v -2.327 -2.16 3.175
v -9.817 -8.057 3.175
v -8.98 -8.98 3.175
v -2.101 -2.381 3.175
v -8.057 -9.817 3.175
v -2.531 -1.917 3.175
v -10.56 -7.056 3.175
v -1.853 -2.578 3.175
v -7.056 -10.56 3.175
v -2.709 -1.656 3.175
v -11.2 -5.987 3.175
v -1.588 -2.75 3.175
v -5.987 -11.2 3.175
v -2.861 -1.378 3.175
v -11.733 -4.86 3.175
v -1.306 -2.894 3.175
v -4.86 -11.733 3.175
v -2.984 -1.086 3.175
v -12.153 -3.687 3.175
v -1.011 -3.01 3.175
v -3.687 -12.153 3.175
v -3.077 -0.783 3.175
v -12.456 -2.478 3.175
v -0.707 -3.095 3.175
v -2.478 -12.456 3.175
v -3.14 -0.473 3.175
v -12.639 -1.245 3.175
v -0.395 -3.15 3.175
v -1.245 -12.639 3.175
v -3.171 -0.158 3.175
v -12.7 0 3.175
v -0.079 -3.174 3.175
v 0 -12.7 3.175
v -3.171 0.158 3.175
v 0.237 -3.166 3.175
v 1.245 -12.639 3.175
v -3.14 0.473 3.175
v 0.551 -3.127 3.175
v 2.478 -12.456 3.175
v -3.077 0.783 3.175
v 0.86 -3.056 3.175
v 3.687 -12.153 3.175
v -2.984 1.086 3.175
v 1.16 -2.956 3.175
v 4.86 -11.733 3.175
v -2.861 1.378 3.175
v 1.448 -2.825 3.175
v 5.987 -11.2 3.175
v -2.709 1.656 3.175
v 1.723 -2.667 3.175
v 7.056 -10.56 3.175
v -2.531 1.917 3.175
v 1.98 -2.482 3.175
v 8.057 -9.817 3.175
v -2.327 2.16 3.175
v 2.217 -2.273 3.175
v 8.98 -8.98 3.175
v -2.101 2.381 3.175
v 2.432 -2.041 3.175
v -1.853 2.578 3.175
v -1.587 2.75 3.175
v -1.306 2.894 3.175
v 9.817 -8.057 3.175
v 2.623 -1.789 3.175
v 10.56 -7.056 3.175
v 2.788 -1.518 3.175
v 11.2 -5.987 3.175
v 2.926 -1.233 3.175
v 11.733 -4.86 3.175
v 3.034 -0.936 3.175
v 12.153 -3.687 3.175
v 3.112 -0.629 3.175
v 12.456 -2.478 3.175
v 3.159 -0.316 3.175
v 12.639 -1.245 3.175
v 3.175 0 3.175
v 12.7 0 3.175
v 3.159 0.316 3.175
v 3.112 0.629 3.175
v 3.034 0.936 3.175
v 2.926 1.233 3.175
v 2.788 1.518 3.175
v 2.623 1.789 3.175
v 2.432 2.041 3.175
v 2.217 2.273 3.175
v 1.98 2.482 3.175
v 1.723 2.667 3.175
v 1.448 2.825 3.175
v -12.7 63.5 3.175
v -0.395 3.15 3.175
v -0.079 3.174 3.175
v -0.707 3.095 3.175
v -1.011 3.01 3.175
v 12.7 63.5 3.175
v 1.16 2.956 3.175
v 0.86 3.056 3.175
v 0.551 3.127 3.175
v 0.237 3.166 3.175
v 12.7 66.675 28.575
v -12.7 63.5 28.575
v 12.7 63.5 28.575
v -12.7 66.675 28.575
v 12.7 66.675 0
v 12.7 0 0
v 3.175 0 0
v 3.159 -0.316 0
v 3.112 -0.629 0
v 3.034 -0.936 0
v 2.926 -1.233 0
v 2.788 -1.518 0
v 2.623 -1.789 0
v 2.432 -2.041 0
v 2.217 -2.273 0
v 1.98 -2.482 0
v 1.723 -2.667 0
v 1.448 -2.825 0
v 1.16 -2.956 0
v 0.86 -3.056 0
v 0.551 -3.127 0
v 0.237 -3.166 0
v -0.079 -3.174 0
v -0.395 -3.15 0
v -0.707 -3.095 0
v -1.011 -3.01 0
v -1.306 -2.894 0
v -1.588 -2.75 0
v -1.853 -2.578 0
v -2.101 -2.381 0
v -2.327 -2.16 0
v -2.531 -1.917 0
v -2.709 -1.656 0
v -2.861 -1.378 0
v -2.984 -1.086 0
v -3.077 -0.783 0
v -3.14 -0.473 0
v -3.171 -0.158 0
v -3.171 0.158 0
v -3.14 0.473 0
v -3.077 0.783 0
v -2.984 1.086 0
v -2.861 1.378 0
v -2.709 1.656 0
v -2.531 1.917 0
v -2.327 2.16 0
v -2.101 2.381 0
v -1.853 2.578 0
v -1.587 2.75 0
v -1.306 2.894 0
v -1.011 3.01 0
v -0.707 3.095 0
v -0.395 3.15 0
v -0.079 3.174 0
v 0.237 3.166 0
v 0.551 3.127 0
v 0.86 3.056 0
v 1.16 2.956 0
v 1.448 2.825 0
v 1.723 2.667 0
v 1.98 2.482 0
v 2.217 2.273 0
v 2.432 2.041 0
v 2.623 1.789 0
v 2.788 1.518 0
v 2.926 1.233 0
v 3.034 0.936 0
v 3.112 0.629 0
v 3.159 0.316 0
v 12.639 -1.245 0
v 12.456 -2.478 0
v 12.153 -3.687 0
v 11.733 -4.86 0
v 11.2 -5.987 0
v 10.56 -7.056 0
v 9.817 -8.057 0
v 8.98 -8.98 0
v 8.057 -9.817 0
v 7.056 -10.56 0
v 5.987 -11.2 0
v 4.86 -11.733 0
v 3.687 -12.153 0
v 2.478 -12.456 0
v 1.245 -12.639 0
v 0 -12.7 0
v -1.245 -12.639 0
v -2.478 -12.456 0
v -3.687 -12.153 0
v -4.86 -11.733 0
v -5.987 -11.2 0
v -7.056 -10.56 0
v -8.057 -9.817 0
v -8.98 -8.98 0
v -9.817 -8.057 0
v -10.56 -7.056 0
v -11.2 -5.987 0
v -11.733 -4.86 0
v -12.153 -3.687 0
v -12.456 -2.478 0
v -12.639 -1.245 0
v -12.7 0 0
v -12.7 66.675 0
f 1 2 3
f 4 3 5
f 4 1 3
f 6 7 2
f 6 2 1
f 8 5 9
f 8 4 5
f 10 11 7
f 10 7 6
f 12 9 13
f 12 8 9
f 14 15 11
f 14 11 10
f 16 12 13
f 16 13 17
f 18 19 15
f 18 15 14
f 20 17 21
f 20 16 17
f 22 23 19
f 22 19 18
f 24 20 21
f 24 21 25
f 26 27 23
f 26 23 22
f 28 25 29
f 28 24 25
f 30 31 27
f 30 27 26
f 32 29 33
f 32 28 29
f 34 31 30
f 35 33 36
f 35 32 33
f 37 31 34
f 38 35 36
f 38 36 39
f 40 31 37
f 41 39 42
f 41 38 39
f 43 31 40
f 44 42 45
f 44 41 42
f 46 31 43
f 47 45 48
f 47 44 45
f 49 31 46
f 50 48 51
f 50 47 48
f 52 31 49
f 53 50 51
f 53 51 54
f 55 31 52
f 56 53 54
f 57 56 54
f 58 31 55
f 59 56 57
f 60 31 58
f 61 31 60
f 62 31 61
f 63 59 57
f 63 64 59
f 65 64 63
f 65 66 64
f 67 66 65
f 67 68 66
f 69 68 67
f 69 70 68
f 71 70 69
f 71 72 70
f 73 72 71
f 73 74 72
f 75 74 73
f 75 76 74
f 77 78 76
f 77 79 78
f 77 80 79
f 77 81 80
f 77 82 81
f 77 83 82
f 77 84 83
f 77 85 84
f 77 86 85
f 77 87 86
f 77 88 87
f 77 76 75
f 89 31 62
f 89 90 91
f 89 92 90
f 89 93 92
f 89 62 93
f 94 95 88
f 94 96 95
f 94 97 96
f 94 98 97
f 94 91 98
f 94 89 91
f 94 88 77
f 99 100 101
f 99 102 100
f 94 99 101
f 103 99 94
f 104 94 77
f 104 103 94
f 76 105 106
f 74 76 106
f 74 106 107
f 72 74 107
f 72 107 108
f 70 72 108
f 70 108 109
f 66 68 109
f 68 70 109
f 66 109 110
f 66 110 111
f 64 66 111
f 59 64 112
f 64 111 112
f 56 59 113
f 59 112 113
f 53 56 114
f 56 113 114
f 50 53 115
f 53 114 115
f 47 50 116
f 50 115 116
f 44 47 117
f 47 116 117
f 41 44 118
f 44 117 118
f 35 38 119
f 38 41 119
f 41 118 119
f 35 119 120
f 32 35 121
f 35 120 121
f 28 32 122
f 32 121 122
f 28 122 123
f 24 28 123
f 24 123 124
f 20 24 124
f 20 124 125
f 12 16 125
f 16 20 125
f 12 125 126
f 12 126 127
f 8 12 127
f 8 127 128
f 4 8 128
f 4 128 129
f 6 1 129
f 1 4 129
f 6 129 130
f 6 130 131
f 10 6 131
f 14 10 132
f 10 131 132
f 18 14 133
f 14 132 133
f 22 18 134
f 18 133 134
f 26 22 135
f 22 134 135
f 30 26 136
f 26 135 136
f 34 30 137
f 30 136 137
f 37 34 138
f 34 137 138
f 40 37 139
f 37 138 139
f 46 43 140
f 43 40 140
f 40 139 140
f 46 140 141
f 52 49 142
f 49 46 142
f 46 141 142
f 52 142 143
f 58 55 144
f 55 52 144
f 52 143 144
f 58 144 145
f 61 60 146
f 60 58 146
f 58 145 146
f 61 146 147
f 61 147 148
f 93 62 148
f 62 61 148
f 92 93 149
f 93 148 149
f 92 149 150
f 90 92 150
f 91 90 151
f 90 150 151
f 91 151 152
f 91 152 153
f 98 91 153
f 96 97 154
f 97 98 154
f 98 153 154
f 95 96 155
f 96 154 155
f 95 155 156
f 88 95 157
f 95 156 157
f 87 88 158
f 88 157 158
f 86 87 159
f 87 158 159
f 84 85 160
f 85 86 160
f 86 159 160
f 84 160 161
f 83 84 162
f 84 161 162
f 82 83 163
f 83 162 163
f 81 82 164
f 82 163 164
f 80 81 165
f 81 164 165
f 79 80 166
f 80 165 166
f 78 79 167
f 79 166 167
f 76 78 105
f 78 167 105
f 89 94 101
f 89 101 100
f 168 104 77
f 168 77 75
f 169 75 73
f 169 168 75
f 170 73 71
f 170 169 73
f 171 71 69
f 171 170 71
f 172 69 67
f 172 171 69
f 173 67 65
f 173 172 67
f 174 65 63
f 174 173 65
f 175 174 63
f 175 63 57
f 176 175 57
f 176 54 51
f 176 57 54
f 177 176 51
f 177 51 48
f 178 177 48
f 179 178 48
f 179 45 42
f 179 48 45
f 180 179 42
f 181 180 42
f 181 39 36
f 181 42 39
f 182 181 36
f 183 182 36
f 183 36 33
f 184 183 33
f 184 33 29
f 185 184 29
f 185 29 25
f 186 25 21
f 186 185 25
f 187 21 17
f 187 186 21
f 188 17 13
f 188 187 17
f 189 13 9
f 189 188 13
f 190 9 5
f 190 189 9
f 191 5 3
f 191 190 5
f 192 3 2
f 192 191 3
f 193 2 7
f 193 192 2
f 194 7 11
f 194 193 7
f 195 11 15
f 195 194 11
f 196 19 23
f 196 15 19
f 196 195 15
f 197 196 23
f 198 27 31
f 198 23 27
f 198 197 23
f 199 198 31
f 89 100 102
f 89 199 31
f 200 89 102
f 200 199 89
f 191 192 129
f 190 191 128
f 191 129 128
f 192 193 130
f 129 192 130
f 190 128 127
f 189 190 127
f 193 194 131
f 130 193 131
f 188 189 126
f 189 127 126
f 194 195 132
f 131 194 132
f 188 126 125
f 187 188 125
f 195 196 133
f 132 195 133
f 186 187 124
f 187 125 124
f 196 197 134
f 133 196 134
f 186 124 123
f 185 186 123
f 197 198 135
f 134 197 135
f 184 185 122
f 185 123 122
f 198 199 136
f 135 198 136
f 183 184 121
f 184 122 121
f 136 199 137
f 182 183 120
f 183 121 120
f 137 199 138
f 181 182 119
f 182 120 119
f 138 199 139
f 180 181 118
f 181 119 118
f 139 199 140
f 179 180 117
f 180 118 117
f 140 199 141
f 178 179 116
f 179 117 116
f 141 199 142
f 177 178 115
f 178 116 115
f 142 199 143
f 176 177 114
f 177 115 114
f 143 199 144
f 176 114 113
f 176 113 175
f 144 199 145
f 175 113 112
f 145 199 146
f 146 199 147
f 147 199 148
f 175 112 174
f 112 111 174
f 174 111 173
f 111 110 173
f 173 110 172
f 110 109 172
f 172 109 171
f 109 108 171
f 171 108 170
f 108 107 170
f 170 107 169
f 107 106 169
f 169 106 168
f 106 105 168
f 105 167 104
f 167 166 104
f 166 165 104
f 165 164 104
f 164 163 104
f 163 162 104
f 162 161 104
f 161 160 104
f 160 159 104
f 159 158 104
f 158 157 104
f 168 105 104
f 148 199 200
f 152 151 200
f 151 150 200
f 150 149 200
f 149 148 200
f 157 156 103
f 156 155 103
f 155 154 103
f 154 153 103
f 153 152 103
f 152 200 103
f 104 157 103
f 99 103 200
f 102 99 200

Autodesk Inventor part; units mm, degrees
ref_plane "YZ Plane" through (0, 0, 0) normal (1, 0, 0) x (0, 1, 0)
ref_plane "XZ Plane" through (0, 0, 0) normal (0, 1, 0) x (-1, 0, 0)
ref_plane "XY Plane" through (0, 0, 0) normal (0, 0, 1) x (1, 0, 0)
sketch "Sketch1" plane through (0, 0, 0) normal (0, 0, 1) x (1, 0, 0)
  circle A0 centre (0, 0) radius 12.7
  line L0 (12.7, 0) -> (12.7, 66.675)
  line L1 (-12.7, 0) -> (-12.7, 66.675)
  line L2 (-12.7, 66.675) -> (12.7, 66.675)
  circle A1 centre (0, 0) radius 3.175
  dimension "d0" = 25.4
  dimension "d1" = 66.675
  dimension "d3" = 6.35
extrude "Extrusion1" add sketch "Sketch1" along normal blind 3.175
sketch "Sketch2" plane through (0, 0, 3.175) normal (0, 0, 1) x (1, 0, 0)
  line L0 (12.7, 66.675) -> (-12.7, 66.675) projected
  line L1 (-12.7, 66.675) -> (12.7, 66.675)
  line L2 (12.7, 66.675) -> (12.7, 63.5)
  line L3 (12.7, 63.5) -> (-12.7, 63.5)
  line L4 (-12.7, 63.5) -> (-12.7, 66.675)
  point P0 (0, 0)
  dimension "d6" = 25.4
  dimension "d7" = 3.175
extrude "Extrusion2" add sketch "Sketch2" along normal blind 25.4
properties part number "Roller holder_CPY"
